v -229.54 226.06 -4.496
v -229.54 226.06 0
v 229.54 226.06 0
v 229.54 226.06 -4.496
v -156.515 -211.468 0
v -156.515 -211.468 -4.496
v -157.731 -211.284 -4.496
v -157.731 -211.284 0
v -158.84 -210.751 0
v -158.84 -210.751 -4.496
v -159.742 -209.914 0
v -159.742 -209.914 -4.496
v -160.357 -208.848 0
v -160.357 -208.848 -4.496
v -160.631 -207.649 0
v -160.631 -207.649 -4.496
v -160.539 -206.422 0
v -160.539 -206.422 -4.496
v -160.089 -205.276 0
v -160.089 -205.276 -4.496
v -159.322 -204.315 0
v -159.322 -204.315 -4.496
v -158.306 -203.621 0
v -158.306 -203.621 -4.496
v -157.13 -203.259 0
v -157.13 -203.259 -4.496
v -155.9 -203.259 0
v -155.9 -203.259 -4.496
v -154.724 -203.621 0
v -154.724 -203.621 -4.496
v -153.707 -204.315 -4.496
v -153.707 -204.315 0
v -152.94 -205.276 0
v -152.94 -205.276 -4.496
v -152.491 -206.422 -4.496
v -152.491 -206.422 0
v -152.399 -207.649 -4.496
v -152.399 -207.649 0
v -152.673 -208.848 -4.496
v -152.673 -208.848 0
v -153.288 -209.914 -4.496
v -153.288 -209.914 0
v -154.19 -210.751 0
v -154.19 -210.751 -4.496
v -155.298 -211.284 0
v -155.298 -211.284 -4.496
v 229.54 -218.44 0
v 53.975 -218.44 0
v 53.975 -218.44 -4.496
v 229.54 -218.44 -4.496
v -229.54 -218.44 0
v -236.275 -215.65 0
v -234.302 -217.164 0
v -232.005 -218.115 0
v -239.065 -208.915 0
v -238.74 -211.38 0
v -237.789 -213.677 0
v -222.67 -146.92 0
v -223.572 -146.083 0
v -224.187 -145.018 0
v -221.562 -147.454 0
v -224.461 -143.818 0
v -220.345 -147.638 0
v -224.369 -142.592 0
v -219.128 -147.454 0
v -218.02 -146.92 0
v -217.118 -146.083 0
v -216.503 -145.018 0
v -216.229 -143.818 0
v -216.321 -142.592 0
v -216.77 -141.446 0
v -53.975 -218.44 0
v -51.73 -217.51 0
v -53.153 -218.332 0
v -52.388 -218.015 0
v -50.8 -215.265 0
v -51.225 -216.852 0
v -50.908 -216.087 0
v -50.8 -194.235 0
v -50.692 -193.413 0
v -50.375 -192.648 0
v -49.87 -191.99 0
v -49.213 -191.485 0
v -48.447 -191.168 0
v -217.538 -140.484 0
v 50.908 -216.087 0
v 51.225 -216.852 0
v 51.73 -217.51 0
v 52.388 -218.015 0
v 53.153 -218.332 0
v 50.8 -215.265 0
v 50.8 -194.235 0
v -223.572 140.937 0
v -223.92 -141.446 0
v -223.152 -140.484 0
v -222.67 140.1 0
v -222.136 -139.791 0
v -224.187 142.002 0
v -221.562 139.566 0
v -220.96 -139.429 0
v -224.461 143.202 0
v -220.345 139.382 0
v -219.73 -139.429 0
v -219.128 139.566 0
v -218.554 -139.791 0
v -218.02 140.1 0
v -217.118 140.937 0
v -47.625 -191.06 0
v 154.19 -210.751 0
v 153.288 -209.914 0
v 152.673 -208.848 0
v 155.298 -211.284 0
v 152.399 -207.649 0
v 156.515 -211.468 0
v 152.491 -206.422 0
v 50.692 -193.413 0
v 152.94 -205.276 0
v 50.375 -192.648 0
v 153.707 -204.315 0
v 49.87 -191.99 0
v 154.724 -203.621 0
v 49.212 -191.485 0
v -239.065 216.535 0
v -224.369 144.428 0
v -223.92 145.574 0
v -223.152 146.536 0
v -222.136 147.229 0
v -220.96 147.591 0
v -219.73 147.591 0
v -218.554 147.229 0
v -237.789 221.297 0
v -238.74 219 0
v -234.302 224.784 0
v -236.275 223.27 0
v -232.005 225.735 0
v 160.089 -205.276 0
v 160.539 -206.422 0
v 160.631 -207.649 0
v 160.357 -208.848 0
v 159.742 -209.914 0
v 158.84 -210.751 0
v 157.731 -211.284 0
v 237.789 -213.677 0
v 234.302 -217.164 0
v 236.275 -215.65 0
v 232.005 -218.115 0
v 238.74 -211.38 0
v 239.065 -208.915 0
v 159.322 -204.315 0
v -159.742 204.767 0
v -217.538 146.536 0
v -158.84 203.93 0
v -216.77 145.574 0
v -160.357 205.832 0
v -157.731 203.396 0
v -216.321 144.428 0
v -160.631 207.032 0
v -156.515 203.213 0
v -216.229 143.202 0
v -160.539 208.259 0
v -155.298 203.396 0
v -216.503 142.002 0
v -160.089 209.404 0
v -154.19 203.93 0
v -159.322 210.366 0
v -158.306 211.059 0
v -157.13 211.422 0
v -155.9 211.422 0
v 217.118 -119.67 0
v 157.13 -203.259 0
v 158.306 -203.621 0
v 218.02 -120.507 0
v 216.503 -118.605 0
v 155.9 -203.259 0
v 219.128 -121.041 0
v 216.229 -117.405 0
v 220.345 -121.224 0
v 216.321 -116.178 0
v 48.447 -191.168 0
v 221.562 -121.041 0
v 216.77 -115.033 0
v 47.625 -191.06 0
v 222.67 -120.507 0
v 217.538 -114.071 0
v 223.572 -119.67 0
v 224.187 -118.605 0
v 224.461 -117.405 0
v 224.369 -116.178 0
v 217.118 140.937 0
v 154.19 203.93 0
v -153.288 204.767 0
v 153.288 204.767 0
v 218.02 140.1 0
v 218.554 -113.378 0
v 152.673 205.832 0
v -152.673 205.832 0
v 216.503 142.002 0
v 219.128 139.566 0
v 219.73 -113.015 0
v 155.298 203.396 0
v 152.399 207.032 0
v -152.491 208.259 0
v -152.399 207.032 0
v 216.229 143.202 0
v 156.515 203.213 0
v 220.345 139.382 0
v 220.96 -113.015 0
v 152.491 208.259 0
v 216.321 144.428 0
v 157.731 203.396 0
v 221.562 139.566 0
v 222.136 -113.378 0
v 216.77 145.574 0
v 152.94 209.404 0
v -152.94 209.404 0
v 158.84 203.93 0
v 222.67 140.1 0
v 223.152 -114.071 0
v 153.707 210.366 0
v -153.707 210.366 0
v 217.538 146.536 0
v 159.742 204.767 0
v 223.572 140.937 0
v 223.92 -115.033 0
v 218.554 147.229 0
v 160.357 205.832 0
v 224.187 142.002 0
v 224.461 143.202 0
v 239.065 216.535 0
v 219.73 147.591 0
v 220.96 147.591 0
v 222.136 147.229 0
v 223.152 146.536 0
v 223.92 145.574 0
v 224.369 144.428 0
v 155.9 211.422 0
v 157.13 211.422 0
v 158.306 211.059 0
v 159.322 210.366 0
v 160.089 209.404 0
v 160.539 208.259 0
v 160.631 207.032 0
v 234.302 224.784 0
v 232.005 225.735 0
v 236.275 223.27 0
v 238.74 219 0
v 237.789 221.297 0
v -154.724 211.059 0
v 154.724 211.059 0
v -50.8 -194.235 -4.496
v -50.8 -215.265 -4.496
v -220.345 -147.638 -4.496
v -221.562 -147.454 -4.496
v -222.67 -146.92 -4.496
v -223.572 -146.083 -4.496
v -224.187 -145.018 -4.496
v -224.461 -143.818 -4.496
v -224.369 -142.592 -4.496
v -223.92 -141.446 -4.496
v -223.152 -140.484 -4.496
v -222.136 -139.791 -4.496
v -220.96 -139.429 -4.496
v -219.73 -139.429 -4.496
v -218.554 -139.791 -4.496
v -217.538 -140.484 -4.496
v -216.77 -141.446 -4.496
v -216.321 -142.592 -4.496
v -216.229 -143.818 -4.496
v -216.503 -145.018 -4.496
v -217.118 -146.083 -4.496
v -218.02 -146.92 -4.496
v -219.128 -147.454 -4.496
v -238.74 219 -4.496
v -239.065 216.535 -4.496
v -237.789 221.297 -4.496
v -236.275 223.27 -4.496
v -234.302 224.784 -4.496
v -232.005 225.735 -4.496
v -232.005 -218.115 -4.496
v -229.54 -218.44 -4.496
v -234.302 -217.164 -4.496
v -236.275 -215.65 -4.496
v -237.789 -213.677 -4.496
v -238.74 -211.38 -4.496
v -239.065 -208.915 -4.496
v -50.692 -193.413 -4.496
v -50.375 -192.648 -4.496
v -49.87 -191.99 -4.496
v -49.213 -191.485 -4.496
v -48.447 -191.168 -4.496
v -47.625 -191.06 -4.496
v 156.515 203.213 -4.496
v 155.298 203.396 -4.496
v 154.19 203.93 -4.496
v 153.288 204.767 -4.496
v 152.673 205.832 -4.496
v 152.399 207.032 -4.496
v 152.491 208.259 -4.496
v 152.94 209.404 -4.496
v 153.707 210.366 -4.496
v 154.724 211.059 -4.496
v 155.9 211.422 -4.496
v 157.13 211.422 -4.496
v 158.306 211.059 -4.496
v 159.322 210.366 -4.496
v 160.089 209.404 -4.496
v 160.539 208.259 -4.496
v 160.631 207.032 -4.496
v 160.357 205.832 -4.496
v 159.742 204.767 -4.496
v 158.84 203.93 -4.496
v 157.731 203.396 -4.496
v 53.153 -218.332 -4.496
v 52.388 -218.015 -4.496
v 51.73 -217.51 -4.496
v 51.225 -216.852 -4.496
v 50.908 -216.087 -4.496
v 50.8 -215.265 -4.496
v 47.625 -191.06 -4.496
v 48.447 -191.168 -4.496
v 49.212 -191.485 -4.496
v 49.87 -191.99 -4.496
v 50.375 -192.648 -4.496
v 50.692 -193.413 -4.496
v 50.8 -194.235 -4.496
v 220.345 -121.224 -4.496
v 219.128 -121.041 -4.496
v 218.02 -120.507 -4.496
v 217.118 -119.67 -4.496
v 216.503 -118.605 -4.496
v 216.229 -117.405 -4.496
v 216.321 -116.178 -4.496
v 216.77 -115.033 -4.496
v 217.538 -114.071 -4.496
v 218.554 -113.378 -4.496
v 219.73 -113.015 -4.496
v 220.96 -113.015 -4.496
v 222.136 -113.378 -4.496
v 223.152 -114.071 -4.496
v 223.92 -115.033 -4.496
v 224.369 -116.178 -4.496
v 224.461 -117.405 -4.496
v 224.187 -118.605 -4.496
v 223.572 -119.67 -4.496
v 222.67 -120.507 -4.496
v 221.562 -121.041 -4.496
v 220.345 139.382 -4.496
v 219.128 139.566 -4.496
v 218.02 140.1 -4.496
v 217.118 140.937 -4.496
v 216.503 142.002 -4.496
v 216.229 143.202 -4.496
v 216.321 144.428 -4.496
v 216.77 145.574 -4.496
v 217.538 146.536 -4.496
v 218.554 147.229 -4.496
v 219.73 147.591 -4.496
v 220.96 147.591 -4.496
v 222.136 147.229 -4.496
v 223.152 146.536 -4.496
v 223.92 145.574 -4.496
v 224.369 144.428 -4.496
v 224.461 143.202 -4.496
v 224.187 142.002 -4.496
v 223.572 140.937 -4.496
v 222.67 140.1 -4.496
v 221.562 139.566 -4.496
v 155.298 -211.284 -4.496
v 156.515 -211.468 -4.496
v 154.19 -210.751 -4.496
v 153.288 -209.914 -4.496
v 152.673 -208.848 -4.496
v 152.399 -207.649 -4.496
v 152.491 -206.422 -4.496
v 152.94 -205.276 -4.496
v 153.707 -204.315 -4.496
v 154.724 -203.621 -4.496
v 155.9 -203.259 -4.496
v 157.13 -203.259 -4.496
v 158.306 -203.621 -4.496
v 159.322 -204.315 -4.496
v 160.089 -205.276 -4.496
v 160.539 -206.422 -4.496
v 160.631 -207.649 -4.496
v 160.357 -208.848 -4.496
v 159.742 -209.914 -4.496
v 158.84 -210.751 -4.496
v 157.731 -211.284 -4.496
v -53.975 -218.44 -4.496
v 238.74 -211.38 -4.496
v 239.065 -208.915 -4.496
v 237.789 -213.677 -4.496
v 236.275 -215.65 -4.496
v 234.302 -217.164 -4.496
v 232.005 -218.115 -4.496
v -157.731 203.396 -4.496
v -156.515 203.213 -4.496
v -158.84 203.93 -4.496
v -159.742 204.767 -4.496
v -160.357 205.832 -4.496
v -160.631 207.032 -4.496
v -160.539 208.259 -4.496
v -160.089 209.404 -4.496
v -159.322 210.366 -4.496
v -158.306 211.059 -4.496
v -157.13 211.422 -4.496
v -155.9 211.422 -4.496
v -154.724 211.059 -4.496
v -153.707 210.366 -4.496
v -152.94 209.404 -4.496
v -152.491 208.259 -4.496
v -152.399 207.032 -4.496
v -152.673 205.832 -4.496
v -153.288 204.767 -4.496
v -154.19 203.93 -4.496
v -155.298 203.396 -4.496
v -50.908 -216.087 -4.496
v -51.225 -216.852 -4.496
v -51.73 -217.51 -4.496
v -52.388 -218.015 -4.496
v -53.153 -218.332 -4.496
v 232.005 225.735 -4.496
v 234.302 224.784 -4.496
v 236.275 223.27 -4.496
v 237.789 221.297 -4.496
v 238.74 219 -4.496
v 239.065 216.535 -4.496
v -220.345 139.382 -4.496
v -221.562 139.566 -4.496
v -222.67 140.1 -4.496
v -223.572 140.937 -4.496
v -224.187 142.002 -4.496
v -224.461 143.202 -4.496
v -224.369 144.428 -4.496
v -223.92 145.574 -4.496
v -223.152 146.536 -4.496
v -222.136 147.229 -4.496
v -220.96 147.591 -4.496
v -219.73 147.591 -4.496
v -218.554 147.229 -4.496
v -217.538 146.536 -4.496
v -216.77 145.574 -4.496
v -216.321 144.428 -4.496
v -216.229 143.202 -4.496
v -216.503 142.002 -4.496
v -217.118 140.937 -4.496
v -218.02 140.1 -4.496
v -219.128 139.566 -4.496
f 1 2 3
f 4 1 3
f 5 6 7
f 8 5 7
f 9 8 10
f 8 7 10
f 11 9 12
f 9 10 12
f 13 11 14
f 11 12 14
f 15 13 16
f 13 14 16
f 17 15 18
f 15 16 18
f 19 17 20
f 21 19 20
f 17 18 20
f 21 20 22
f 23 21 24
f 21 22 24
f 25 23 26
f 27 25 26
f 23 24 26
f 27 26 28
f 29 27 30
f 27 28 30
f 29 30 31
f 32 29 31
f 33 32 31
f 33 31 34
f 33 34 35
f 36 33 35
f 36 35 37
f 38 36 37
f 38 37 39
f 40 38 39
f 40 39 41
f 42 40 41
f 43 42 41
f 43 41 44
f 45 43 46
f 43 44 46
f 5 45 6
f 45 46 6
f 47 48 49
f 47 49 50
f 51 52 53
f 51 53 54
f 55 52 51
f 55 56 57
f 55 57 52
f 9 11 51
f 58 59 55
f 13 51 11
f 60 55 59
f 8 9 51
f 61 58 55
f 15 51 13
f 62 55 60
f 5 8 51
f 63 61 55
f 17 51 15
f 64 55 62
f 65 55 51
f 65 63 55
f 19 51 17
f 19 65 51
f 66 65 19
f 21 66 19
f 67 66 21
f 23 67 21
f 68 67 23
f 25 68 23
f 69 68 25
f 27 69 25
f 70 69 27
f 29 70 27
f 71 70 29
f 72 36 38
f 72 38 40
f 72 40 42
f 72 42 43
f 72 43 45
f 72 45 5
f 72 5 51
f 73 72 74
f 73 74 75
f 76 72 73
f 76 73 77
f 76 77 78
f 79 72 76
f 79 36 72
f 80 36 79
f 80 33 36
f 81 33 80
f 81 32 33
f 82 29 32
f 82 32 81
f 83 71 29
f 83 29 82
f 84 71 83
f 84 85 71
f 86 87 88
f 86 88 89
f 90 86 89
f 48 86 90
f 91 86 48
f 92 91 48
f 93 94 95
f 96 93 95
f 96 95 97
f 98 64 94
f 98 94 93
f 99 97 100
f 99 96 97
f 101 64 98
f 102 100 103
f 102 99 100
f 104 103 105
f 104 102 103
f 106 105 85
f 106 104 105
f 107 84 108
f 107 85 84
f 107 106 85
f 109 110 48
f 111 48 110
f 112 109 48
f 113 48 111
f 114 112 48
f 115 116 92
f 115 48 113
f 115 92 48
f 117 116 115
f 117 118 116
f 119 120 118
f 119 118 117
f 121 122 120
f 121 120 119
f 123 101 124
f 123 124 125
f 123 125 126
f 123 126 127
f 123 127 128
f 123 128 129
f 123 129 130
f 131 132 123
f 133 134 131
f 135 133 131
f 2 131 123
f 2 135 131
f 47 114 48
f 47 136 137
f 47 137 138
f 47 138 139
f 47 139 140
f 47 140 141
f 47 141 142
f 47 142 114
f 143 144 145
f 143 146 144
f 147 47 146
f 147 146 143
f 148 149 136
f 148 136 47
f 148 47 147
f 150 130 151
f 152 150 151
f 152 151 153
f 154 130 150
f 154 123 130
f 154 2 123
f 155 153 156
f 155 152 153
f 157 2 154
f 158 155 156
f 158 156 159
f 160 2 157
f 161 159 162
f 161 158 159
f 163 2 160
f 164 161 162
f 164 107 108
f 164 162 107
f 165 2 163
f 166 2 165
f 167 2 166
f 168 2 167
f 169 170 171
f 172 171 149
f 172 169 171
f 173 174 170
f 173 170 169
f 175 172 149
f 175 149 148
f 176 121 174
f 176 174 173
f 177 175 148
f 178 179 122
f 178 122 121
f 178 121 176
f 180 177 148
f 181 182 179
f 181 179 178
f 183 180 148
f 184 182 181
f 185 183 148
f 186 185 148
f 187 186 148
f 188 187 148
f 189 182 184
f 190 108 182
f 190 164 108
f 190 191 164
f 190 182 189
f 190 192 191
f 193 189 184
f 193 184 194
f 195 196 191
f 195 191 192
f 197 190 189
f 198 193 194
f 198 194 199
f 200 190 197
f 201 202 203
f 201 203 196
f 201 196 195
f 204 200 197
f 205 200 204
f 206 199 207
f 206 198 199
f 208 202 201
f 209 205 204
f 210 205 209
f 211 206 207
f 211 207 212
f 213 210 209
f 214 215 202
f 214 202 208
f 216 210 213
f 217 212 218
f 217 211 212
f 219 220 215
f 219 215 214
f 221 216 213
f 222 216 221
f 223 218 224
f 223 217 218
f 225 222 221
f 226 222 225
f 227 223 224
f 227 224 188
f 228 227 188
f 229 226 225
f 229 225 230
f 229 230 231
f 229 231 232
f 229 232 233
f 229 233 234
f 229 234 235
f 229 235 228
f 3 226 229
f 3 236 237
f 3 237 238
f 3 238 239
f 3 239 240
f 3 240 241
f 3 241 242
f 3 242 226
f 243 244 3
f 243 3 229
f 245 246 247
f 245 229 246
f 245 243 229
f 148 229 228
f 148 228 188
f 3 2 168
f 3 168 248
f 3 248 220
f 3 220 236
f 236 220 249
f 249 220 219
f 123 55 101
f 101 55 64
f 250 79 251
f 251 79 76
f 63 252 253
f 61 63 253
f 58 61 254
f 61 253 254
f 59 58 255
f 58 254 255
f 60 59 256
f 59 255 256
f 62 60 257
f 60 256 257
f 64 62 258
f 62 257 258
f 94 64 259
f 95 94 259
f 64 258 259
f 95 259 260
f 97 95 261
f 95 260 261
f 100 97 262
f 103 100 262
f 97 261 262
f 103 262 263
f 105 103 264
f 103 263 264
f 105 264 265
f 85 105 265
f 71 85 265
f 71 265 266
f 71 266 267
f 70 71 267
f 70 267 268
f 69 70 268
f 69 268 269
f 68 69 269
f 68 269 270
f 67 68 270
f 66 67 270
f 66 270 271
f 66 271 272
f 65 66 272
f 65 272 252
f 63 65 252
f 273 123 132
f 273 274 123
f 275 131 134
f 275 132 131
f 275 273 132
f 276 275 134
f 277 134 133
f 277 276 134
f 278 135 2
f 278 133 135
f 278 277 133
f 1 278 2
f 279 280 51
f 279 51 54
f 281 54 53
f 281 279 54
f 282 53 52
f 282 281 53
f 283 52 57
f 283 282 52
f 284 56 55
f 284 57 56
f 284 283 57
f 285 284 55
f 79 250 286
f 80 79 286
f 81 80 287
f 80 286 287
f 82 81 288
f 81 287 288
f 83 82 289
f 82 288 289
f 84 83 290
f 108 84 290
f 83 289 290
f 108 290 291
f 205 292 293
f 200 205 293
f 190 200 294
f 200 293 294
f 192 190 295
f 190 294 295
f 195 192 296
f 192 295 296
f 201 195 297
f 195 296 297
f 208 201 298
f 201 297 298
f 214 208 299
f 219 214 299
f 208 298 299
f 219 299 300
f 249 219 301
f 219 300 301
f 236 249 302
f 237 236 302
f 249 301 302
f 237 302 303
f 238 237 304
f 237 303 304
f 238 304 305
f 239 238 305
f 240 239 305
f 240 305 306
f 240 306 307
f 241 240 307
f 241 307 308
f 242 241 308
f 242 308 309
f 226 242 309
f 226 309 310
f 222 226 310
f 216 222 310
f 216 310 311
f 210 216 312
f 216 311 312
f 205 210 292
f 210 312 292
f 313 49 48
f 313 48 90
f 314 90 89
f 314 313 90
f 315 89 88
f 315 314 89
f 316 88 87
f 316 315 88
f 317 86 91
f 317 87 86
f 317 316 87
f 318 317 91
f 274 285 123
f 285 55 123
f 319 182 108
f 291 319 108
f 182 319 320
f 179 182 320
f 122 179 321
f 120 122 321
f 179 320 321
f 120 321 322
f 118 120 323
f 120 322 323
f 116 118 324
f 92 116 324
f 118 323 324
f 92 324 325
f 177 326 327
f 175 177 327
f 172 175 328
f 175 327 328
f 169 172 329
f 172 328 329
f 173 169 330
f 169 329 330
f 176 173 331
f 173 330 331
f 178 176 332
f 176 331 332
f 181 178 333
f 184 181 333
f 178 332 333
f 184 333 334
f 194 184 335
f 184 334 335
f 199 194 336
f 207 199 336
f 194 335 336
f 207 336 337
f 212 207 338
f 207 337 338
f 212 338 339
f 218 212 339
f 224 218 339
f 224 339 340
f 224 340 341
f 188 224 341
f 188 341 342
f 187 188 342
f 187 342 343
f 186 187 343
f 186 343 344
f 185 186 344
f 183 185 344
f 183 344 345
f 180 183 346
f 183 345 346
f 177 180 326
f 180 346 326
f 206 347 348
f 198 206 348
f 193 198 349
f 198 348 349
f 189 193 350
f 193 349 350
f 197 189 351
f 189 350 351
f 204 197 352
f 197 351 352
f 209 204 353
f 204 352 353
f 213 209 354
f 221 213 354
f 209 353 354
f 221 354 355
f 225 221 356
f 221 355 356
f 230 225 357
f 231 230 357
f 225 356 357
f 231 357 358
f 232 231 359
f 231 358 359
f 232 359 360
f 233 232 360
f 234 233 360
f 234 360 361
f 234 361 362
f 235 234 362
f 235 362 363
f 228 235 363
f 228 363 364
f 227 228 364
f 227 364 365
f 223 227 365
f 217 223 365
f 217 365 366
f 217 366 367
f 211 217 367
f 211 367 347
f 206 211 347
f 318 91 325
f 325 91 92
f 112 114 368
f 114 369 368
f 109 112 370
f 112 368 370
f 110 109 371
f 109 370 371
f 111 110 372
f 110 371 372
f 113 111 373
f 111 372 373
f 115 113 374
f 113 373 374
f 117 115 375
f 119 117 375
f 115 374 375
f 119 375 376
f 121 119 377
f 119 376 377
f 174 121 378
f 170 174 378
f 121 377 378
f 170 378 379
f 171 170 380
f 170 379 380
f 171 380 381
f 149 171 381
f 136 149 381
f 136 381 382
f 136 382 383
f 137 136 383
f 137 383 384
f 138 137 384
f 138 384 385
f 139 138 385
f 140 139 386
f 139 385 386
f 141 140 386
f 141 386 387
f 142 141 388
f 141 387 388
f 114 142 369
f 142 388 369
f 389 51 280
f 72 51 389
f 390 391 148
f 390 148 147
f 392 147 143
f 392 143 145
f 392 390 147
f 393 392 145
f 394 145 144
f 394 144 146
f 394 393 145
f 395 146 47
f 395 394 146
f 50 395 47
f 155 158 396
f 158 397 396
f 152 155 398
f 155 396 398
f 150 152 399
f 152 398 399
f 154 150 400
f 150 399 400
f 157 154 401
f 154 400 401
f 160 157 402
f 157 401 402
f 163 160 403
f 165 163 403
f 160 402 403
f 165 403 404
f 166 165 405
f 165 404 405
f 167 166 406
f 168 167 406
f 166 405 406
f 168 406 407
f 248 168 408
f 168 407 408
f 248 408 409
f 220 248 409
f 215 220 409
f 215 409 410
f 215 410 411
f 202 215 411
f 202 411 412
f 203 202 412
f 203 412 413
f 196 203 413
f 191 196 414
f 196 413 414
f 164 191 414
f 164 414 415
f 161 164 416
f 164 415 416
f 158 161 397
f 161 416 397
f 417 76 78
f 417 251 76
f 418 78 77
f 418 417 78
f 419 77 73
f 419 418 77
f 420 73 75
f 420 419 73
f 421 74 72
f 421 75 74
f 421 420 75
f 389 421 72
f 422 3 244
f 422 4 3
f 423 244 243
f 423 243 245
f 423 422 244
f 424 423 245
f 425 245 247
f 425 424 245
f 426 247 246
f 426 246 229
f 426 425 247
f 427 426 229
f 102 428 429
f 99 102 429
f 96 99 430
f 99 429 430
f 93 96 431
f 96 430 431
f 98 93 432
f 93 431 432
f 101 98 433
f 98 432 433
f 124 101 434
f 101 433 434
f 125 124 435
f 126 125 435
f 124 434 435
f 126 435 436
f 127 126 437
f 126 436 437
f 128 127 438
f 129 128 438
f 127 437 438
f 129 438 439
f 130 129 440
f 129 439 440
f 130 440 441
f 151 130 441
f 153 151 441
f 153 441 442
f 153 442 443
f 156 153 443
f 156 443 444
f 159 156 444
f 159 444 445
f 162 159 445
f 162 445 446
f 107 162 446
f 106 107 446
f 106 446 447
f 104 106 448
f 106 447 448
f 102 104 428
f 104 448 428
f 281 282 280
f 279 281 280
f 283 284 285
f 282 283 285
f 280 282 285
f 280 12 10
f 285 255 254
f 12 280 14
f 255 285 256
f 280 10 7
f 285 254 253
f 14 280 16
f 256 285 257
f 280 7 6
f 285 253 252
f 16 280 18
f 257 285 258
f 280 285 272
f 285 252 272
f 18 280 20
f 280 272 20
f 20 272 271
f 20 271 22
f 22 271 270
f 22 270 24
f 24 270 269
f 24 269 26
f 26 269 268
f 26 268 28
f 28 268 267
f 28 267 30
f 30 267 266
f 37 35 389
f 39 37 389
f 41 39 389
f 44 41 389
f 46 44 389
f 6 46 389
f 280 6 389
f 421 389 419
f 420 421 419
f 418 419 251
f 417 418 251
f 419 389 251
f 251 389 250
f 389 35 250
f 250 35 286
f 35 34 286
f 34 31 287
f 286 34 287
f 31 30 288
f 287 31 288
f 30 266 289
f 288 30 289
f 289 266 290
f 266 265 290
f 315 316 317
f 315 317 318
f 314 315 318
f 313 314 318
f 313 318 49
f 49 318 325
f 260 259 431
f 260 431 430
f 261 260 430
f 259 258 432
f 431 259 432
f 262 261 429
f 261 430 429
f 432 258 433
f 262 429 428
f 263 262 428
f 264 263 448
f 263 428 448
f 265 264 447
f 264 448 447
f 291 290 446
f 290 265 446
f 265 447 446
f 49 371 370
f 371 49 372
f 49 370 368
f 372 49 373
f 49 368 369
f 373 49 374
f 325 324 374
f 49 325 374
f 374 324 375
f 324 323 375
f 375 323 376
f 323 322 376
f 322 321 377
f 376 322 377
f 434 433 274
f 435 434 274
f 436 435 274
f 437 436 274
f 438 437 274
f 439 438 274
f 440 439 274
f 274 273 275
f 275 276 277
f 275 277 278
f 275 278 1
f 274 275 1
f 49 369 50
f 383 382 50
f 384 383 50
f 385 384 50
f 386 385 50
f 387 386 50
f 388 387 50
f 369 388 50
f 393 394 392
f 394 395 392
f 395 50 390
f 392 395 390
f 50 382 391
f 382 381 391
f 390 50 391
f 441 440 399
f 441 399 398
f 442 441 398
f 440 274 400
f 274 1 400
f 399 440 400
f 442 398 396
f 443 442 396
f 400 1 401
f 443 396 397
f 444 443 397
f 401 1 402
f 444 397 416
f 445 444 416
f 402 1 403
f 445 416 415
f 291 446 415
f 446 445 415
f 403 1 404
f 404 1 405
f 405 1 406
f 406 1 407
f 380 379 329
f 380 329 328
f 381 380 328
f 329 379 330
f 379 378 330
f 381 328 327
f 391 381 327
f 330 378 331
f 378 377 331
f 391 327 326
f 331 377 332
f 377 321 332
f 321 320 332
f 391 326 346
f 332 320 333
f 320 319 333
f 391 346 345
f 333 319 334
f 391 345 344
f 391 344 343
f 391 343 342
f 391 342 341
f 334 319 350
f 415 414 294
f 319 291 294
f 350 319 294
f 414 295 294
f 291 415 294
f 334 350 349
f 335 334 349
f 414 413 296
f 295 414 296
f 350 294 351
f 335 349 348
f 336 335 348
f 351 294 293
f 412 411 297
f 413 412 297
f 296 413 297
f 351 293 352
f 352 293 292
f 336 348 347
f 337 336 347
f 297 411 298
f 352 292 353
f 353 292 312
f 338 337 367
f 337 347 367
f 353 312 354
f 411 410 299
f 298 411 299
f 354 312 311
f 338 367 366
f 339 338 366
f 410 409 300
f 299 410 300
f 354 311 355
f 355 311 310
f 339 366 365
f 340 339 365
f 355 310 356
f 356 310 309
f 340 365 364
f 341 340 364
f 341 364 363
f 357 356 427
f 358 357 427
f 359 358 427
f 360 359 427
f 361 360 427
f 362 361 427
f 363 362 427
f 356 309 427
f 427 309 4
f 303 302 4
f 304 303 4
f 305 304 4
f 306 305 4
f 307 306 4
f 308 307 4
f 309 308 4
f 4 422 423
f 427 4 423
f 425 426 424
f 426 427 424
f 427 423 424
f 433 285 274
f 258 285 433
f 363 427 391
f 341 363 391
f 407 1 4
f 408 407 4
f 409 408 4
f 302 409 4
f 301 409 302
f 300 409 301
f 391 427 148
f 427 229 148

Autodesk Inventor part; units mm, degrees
ref_plane "YZ Plane" through (0, 0, 0) normal (1, 0, 0) x (0, 1, 0)
ref_plane "XZ Plane" through (0, 0, 0) normal (0, 1, 0) x (-1, 0, 0)
ref_plane "XY Plane" through (0, 0, 0) normal (0, 0, 1) x (1, 0, 0)
sketch "Sketch1" plane through (0, 0, 0) normal (0, 0, 1) x (1, 0, 0)
  line L0 (0, 316.484) -> (0, -316.484) projected
  line L1 (-334.6907, 0) -> (334.6907, 0) projected
  line L2 (239.0648, -226.06) -> (-239.0648, -226.06)
  line L3 (-239.0648, -226.06) -> (-239.0648, 226.06)
  line L4 (-239.0648, 226.06) -> (239.0648, 226.06)
  line L5 (239.0648, 226.06) -> (239.0648, -226.06)
  line L6 (239.0648, -226.06) -> (-239.0648, 226.06) construction
  line L7 (-239.0648, -226.06) -> (239.0648, 226.06) construction
  line L8 (220.345, -207.3402) -> (-220.345, -207.3402) construction
  line L9 (-220.345, -207.3402) -> (-220.345, 207.3402) construction
  line L10 (-220.345, 207.3402) -> (220.345, 207.3402) construction
  line L11 (220.345, 207.3402) -> (220.345, -207.3402) construction
  line L12 (220.345, -207.3402) -> (-220.345, 207.3402) construction
  line L13 (-220.345, -207.3402) -> (220.345, 207.3402) construction
  line L14 (-239.0648, -218.44) -> (239.0648, -218.44)
  line L15 (50.8, -191.06) -> (-50.8, -191.06)
  line L16 (-50.8, -191.06) -> (-50.8, -218.44)
  line L17 (-50.8, -218.44) -> (50.8, -218.44)
  line L18 (50.8, -218.44) -> (50.8, -191.06)
  line L19 (50.8, -191.06) -> (-50.8, -218.44) construction
  line L20 (-50.8, -191.06) -> (50.8, -218.44) construction
  point P0 (0, 0)
  point P1 (-156.5148, 207.3402)
  point P2 (0, 207.3402)
  point P3 (156.5148, 207.3402)
  point P4 (-156.5148, -207.3402)
  point P5 (0, -207.3402)
  point P6 (156.5148, -207.3402)
  point P7 (-220.345, 143.51)
  point P8 (-220.345, -143.51)
  point P9 (220.345, 143.51)
  point P10 (220.345, -117.0967)
  point P11 (-220.345, 0)
  point P12 (0, -218.44)
  point P13 (0, -226.06)
  point P14 (0, -204.75)
  point P15 (50.8, -218.44)
  dimension "d0" = 478.1296
  dimension "d1" = 452.12
  dimension "d3" = 18.7198
  dimension "d4" = 18.7198
  dimension "d7" = 143.51
  dimension "d8" = 143.51
  dimension "d10" = 82.55
  dimension "d20" = 82.55
  dimension "d21" = 82.55
  dimension "d23" = 7.62
  dimension "d24" = 35
  dimension "d25" = 101.6
extrude "Extrusion1" add sketch "Sketch1" against normal blind 4.4958 contours L4 L5 L1 L0 | L0 L1 L3 L4 | L1 L5 L14 L18 L15 L0 | L0 L15 L16 L14 L3 L1
hole "Hole1" at (-156.5148, 207.3402, 0) at (156.5148, 207.3402, 0) at (-156.5148, -207.3402, 0) at (156.5148, -207.3402, 0) at (220.345, 143.51, 0) at (220.345, -117.0967, 0) at (-220.345, 143.51, 0) at (-220.345, -143.51, 0) direction (0, 0, -1) diameter 8.255 end through all
fillet "Fillet1" radius 9.525 2 edges at (-239.0648, 226.06, -2.2479) (239.0648, 226.06, -2.2479)
fillet "Fillet2" radius 9.525 2 edges at (-239.0648, -218.44, -2.2479) (239.0648, -218.44, -2.2479)
fillet "Fillet3" radius 3.175 4 edges at (50.8, -191.06, -2.2479) (50.8, -218.44, -2.2479) (-50.8, -191.06, -2.2479) (-50.8, -218.44, -2.2479)
properties material "ACRYLIC, CLEAR"
